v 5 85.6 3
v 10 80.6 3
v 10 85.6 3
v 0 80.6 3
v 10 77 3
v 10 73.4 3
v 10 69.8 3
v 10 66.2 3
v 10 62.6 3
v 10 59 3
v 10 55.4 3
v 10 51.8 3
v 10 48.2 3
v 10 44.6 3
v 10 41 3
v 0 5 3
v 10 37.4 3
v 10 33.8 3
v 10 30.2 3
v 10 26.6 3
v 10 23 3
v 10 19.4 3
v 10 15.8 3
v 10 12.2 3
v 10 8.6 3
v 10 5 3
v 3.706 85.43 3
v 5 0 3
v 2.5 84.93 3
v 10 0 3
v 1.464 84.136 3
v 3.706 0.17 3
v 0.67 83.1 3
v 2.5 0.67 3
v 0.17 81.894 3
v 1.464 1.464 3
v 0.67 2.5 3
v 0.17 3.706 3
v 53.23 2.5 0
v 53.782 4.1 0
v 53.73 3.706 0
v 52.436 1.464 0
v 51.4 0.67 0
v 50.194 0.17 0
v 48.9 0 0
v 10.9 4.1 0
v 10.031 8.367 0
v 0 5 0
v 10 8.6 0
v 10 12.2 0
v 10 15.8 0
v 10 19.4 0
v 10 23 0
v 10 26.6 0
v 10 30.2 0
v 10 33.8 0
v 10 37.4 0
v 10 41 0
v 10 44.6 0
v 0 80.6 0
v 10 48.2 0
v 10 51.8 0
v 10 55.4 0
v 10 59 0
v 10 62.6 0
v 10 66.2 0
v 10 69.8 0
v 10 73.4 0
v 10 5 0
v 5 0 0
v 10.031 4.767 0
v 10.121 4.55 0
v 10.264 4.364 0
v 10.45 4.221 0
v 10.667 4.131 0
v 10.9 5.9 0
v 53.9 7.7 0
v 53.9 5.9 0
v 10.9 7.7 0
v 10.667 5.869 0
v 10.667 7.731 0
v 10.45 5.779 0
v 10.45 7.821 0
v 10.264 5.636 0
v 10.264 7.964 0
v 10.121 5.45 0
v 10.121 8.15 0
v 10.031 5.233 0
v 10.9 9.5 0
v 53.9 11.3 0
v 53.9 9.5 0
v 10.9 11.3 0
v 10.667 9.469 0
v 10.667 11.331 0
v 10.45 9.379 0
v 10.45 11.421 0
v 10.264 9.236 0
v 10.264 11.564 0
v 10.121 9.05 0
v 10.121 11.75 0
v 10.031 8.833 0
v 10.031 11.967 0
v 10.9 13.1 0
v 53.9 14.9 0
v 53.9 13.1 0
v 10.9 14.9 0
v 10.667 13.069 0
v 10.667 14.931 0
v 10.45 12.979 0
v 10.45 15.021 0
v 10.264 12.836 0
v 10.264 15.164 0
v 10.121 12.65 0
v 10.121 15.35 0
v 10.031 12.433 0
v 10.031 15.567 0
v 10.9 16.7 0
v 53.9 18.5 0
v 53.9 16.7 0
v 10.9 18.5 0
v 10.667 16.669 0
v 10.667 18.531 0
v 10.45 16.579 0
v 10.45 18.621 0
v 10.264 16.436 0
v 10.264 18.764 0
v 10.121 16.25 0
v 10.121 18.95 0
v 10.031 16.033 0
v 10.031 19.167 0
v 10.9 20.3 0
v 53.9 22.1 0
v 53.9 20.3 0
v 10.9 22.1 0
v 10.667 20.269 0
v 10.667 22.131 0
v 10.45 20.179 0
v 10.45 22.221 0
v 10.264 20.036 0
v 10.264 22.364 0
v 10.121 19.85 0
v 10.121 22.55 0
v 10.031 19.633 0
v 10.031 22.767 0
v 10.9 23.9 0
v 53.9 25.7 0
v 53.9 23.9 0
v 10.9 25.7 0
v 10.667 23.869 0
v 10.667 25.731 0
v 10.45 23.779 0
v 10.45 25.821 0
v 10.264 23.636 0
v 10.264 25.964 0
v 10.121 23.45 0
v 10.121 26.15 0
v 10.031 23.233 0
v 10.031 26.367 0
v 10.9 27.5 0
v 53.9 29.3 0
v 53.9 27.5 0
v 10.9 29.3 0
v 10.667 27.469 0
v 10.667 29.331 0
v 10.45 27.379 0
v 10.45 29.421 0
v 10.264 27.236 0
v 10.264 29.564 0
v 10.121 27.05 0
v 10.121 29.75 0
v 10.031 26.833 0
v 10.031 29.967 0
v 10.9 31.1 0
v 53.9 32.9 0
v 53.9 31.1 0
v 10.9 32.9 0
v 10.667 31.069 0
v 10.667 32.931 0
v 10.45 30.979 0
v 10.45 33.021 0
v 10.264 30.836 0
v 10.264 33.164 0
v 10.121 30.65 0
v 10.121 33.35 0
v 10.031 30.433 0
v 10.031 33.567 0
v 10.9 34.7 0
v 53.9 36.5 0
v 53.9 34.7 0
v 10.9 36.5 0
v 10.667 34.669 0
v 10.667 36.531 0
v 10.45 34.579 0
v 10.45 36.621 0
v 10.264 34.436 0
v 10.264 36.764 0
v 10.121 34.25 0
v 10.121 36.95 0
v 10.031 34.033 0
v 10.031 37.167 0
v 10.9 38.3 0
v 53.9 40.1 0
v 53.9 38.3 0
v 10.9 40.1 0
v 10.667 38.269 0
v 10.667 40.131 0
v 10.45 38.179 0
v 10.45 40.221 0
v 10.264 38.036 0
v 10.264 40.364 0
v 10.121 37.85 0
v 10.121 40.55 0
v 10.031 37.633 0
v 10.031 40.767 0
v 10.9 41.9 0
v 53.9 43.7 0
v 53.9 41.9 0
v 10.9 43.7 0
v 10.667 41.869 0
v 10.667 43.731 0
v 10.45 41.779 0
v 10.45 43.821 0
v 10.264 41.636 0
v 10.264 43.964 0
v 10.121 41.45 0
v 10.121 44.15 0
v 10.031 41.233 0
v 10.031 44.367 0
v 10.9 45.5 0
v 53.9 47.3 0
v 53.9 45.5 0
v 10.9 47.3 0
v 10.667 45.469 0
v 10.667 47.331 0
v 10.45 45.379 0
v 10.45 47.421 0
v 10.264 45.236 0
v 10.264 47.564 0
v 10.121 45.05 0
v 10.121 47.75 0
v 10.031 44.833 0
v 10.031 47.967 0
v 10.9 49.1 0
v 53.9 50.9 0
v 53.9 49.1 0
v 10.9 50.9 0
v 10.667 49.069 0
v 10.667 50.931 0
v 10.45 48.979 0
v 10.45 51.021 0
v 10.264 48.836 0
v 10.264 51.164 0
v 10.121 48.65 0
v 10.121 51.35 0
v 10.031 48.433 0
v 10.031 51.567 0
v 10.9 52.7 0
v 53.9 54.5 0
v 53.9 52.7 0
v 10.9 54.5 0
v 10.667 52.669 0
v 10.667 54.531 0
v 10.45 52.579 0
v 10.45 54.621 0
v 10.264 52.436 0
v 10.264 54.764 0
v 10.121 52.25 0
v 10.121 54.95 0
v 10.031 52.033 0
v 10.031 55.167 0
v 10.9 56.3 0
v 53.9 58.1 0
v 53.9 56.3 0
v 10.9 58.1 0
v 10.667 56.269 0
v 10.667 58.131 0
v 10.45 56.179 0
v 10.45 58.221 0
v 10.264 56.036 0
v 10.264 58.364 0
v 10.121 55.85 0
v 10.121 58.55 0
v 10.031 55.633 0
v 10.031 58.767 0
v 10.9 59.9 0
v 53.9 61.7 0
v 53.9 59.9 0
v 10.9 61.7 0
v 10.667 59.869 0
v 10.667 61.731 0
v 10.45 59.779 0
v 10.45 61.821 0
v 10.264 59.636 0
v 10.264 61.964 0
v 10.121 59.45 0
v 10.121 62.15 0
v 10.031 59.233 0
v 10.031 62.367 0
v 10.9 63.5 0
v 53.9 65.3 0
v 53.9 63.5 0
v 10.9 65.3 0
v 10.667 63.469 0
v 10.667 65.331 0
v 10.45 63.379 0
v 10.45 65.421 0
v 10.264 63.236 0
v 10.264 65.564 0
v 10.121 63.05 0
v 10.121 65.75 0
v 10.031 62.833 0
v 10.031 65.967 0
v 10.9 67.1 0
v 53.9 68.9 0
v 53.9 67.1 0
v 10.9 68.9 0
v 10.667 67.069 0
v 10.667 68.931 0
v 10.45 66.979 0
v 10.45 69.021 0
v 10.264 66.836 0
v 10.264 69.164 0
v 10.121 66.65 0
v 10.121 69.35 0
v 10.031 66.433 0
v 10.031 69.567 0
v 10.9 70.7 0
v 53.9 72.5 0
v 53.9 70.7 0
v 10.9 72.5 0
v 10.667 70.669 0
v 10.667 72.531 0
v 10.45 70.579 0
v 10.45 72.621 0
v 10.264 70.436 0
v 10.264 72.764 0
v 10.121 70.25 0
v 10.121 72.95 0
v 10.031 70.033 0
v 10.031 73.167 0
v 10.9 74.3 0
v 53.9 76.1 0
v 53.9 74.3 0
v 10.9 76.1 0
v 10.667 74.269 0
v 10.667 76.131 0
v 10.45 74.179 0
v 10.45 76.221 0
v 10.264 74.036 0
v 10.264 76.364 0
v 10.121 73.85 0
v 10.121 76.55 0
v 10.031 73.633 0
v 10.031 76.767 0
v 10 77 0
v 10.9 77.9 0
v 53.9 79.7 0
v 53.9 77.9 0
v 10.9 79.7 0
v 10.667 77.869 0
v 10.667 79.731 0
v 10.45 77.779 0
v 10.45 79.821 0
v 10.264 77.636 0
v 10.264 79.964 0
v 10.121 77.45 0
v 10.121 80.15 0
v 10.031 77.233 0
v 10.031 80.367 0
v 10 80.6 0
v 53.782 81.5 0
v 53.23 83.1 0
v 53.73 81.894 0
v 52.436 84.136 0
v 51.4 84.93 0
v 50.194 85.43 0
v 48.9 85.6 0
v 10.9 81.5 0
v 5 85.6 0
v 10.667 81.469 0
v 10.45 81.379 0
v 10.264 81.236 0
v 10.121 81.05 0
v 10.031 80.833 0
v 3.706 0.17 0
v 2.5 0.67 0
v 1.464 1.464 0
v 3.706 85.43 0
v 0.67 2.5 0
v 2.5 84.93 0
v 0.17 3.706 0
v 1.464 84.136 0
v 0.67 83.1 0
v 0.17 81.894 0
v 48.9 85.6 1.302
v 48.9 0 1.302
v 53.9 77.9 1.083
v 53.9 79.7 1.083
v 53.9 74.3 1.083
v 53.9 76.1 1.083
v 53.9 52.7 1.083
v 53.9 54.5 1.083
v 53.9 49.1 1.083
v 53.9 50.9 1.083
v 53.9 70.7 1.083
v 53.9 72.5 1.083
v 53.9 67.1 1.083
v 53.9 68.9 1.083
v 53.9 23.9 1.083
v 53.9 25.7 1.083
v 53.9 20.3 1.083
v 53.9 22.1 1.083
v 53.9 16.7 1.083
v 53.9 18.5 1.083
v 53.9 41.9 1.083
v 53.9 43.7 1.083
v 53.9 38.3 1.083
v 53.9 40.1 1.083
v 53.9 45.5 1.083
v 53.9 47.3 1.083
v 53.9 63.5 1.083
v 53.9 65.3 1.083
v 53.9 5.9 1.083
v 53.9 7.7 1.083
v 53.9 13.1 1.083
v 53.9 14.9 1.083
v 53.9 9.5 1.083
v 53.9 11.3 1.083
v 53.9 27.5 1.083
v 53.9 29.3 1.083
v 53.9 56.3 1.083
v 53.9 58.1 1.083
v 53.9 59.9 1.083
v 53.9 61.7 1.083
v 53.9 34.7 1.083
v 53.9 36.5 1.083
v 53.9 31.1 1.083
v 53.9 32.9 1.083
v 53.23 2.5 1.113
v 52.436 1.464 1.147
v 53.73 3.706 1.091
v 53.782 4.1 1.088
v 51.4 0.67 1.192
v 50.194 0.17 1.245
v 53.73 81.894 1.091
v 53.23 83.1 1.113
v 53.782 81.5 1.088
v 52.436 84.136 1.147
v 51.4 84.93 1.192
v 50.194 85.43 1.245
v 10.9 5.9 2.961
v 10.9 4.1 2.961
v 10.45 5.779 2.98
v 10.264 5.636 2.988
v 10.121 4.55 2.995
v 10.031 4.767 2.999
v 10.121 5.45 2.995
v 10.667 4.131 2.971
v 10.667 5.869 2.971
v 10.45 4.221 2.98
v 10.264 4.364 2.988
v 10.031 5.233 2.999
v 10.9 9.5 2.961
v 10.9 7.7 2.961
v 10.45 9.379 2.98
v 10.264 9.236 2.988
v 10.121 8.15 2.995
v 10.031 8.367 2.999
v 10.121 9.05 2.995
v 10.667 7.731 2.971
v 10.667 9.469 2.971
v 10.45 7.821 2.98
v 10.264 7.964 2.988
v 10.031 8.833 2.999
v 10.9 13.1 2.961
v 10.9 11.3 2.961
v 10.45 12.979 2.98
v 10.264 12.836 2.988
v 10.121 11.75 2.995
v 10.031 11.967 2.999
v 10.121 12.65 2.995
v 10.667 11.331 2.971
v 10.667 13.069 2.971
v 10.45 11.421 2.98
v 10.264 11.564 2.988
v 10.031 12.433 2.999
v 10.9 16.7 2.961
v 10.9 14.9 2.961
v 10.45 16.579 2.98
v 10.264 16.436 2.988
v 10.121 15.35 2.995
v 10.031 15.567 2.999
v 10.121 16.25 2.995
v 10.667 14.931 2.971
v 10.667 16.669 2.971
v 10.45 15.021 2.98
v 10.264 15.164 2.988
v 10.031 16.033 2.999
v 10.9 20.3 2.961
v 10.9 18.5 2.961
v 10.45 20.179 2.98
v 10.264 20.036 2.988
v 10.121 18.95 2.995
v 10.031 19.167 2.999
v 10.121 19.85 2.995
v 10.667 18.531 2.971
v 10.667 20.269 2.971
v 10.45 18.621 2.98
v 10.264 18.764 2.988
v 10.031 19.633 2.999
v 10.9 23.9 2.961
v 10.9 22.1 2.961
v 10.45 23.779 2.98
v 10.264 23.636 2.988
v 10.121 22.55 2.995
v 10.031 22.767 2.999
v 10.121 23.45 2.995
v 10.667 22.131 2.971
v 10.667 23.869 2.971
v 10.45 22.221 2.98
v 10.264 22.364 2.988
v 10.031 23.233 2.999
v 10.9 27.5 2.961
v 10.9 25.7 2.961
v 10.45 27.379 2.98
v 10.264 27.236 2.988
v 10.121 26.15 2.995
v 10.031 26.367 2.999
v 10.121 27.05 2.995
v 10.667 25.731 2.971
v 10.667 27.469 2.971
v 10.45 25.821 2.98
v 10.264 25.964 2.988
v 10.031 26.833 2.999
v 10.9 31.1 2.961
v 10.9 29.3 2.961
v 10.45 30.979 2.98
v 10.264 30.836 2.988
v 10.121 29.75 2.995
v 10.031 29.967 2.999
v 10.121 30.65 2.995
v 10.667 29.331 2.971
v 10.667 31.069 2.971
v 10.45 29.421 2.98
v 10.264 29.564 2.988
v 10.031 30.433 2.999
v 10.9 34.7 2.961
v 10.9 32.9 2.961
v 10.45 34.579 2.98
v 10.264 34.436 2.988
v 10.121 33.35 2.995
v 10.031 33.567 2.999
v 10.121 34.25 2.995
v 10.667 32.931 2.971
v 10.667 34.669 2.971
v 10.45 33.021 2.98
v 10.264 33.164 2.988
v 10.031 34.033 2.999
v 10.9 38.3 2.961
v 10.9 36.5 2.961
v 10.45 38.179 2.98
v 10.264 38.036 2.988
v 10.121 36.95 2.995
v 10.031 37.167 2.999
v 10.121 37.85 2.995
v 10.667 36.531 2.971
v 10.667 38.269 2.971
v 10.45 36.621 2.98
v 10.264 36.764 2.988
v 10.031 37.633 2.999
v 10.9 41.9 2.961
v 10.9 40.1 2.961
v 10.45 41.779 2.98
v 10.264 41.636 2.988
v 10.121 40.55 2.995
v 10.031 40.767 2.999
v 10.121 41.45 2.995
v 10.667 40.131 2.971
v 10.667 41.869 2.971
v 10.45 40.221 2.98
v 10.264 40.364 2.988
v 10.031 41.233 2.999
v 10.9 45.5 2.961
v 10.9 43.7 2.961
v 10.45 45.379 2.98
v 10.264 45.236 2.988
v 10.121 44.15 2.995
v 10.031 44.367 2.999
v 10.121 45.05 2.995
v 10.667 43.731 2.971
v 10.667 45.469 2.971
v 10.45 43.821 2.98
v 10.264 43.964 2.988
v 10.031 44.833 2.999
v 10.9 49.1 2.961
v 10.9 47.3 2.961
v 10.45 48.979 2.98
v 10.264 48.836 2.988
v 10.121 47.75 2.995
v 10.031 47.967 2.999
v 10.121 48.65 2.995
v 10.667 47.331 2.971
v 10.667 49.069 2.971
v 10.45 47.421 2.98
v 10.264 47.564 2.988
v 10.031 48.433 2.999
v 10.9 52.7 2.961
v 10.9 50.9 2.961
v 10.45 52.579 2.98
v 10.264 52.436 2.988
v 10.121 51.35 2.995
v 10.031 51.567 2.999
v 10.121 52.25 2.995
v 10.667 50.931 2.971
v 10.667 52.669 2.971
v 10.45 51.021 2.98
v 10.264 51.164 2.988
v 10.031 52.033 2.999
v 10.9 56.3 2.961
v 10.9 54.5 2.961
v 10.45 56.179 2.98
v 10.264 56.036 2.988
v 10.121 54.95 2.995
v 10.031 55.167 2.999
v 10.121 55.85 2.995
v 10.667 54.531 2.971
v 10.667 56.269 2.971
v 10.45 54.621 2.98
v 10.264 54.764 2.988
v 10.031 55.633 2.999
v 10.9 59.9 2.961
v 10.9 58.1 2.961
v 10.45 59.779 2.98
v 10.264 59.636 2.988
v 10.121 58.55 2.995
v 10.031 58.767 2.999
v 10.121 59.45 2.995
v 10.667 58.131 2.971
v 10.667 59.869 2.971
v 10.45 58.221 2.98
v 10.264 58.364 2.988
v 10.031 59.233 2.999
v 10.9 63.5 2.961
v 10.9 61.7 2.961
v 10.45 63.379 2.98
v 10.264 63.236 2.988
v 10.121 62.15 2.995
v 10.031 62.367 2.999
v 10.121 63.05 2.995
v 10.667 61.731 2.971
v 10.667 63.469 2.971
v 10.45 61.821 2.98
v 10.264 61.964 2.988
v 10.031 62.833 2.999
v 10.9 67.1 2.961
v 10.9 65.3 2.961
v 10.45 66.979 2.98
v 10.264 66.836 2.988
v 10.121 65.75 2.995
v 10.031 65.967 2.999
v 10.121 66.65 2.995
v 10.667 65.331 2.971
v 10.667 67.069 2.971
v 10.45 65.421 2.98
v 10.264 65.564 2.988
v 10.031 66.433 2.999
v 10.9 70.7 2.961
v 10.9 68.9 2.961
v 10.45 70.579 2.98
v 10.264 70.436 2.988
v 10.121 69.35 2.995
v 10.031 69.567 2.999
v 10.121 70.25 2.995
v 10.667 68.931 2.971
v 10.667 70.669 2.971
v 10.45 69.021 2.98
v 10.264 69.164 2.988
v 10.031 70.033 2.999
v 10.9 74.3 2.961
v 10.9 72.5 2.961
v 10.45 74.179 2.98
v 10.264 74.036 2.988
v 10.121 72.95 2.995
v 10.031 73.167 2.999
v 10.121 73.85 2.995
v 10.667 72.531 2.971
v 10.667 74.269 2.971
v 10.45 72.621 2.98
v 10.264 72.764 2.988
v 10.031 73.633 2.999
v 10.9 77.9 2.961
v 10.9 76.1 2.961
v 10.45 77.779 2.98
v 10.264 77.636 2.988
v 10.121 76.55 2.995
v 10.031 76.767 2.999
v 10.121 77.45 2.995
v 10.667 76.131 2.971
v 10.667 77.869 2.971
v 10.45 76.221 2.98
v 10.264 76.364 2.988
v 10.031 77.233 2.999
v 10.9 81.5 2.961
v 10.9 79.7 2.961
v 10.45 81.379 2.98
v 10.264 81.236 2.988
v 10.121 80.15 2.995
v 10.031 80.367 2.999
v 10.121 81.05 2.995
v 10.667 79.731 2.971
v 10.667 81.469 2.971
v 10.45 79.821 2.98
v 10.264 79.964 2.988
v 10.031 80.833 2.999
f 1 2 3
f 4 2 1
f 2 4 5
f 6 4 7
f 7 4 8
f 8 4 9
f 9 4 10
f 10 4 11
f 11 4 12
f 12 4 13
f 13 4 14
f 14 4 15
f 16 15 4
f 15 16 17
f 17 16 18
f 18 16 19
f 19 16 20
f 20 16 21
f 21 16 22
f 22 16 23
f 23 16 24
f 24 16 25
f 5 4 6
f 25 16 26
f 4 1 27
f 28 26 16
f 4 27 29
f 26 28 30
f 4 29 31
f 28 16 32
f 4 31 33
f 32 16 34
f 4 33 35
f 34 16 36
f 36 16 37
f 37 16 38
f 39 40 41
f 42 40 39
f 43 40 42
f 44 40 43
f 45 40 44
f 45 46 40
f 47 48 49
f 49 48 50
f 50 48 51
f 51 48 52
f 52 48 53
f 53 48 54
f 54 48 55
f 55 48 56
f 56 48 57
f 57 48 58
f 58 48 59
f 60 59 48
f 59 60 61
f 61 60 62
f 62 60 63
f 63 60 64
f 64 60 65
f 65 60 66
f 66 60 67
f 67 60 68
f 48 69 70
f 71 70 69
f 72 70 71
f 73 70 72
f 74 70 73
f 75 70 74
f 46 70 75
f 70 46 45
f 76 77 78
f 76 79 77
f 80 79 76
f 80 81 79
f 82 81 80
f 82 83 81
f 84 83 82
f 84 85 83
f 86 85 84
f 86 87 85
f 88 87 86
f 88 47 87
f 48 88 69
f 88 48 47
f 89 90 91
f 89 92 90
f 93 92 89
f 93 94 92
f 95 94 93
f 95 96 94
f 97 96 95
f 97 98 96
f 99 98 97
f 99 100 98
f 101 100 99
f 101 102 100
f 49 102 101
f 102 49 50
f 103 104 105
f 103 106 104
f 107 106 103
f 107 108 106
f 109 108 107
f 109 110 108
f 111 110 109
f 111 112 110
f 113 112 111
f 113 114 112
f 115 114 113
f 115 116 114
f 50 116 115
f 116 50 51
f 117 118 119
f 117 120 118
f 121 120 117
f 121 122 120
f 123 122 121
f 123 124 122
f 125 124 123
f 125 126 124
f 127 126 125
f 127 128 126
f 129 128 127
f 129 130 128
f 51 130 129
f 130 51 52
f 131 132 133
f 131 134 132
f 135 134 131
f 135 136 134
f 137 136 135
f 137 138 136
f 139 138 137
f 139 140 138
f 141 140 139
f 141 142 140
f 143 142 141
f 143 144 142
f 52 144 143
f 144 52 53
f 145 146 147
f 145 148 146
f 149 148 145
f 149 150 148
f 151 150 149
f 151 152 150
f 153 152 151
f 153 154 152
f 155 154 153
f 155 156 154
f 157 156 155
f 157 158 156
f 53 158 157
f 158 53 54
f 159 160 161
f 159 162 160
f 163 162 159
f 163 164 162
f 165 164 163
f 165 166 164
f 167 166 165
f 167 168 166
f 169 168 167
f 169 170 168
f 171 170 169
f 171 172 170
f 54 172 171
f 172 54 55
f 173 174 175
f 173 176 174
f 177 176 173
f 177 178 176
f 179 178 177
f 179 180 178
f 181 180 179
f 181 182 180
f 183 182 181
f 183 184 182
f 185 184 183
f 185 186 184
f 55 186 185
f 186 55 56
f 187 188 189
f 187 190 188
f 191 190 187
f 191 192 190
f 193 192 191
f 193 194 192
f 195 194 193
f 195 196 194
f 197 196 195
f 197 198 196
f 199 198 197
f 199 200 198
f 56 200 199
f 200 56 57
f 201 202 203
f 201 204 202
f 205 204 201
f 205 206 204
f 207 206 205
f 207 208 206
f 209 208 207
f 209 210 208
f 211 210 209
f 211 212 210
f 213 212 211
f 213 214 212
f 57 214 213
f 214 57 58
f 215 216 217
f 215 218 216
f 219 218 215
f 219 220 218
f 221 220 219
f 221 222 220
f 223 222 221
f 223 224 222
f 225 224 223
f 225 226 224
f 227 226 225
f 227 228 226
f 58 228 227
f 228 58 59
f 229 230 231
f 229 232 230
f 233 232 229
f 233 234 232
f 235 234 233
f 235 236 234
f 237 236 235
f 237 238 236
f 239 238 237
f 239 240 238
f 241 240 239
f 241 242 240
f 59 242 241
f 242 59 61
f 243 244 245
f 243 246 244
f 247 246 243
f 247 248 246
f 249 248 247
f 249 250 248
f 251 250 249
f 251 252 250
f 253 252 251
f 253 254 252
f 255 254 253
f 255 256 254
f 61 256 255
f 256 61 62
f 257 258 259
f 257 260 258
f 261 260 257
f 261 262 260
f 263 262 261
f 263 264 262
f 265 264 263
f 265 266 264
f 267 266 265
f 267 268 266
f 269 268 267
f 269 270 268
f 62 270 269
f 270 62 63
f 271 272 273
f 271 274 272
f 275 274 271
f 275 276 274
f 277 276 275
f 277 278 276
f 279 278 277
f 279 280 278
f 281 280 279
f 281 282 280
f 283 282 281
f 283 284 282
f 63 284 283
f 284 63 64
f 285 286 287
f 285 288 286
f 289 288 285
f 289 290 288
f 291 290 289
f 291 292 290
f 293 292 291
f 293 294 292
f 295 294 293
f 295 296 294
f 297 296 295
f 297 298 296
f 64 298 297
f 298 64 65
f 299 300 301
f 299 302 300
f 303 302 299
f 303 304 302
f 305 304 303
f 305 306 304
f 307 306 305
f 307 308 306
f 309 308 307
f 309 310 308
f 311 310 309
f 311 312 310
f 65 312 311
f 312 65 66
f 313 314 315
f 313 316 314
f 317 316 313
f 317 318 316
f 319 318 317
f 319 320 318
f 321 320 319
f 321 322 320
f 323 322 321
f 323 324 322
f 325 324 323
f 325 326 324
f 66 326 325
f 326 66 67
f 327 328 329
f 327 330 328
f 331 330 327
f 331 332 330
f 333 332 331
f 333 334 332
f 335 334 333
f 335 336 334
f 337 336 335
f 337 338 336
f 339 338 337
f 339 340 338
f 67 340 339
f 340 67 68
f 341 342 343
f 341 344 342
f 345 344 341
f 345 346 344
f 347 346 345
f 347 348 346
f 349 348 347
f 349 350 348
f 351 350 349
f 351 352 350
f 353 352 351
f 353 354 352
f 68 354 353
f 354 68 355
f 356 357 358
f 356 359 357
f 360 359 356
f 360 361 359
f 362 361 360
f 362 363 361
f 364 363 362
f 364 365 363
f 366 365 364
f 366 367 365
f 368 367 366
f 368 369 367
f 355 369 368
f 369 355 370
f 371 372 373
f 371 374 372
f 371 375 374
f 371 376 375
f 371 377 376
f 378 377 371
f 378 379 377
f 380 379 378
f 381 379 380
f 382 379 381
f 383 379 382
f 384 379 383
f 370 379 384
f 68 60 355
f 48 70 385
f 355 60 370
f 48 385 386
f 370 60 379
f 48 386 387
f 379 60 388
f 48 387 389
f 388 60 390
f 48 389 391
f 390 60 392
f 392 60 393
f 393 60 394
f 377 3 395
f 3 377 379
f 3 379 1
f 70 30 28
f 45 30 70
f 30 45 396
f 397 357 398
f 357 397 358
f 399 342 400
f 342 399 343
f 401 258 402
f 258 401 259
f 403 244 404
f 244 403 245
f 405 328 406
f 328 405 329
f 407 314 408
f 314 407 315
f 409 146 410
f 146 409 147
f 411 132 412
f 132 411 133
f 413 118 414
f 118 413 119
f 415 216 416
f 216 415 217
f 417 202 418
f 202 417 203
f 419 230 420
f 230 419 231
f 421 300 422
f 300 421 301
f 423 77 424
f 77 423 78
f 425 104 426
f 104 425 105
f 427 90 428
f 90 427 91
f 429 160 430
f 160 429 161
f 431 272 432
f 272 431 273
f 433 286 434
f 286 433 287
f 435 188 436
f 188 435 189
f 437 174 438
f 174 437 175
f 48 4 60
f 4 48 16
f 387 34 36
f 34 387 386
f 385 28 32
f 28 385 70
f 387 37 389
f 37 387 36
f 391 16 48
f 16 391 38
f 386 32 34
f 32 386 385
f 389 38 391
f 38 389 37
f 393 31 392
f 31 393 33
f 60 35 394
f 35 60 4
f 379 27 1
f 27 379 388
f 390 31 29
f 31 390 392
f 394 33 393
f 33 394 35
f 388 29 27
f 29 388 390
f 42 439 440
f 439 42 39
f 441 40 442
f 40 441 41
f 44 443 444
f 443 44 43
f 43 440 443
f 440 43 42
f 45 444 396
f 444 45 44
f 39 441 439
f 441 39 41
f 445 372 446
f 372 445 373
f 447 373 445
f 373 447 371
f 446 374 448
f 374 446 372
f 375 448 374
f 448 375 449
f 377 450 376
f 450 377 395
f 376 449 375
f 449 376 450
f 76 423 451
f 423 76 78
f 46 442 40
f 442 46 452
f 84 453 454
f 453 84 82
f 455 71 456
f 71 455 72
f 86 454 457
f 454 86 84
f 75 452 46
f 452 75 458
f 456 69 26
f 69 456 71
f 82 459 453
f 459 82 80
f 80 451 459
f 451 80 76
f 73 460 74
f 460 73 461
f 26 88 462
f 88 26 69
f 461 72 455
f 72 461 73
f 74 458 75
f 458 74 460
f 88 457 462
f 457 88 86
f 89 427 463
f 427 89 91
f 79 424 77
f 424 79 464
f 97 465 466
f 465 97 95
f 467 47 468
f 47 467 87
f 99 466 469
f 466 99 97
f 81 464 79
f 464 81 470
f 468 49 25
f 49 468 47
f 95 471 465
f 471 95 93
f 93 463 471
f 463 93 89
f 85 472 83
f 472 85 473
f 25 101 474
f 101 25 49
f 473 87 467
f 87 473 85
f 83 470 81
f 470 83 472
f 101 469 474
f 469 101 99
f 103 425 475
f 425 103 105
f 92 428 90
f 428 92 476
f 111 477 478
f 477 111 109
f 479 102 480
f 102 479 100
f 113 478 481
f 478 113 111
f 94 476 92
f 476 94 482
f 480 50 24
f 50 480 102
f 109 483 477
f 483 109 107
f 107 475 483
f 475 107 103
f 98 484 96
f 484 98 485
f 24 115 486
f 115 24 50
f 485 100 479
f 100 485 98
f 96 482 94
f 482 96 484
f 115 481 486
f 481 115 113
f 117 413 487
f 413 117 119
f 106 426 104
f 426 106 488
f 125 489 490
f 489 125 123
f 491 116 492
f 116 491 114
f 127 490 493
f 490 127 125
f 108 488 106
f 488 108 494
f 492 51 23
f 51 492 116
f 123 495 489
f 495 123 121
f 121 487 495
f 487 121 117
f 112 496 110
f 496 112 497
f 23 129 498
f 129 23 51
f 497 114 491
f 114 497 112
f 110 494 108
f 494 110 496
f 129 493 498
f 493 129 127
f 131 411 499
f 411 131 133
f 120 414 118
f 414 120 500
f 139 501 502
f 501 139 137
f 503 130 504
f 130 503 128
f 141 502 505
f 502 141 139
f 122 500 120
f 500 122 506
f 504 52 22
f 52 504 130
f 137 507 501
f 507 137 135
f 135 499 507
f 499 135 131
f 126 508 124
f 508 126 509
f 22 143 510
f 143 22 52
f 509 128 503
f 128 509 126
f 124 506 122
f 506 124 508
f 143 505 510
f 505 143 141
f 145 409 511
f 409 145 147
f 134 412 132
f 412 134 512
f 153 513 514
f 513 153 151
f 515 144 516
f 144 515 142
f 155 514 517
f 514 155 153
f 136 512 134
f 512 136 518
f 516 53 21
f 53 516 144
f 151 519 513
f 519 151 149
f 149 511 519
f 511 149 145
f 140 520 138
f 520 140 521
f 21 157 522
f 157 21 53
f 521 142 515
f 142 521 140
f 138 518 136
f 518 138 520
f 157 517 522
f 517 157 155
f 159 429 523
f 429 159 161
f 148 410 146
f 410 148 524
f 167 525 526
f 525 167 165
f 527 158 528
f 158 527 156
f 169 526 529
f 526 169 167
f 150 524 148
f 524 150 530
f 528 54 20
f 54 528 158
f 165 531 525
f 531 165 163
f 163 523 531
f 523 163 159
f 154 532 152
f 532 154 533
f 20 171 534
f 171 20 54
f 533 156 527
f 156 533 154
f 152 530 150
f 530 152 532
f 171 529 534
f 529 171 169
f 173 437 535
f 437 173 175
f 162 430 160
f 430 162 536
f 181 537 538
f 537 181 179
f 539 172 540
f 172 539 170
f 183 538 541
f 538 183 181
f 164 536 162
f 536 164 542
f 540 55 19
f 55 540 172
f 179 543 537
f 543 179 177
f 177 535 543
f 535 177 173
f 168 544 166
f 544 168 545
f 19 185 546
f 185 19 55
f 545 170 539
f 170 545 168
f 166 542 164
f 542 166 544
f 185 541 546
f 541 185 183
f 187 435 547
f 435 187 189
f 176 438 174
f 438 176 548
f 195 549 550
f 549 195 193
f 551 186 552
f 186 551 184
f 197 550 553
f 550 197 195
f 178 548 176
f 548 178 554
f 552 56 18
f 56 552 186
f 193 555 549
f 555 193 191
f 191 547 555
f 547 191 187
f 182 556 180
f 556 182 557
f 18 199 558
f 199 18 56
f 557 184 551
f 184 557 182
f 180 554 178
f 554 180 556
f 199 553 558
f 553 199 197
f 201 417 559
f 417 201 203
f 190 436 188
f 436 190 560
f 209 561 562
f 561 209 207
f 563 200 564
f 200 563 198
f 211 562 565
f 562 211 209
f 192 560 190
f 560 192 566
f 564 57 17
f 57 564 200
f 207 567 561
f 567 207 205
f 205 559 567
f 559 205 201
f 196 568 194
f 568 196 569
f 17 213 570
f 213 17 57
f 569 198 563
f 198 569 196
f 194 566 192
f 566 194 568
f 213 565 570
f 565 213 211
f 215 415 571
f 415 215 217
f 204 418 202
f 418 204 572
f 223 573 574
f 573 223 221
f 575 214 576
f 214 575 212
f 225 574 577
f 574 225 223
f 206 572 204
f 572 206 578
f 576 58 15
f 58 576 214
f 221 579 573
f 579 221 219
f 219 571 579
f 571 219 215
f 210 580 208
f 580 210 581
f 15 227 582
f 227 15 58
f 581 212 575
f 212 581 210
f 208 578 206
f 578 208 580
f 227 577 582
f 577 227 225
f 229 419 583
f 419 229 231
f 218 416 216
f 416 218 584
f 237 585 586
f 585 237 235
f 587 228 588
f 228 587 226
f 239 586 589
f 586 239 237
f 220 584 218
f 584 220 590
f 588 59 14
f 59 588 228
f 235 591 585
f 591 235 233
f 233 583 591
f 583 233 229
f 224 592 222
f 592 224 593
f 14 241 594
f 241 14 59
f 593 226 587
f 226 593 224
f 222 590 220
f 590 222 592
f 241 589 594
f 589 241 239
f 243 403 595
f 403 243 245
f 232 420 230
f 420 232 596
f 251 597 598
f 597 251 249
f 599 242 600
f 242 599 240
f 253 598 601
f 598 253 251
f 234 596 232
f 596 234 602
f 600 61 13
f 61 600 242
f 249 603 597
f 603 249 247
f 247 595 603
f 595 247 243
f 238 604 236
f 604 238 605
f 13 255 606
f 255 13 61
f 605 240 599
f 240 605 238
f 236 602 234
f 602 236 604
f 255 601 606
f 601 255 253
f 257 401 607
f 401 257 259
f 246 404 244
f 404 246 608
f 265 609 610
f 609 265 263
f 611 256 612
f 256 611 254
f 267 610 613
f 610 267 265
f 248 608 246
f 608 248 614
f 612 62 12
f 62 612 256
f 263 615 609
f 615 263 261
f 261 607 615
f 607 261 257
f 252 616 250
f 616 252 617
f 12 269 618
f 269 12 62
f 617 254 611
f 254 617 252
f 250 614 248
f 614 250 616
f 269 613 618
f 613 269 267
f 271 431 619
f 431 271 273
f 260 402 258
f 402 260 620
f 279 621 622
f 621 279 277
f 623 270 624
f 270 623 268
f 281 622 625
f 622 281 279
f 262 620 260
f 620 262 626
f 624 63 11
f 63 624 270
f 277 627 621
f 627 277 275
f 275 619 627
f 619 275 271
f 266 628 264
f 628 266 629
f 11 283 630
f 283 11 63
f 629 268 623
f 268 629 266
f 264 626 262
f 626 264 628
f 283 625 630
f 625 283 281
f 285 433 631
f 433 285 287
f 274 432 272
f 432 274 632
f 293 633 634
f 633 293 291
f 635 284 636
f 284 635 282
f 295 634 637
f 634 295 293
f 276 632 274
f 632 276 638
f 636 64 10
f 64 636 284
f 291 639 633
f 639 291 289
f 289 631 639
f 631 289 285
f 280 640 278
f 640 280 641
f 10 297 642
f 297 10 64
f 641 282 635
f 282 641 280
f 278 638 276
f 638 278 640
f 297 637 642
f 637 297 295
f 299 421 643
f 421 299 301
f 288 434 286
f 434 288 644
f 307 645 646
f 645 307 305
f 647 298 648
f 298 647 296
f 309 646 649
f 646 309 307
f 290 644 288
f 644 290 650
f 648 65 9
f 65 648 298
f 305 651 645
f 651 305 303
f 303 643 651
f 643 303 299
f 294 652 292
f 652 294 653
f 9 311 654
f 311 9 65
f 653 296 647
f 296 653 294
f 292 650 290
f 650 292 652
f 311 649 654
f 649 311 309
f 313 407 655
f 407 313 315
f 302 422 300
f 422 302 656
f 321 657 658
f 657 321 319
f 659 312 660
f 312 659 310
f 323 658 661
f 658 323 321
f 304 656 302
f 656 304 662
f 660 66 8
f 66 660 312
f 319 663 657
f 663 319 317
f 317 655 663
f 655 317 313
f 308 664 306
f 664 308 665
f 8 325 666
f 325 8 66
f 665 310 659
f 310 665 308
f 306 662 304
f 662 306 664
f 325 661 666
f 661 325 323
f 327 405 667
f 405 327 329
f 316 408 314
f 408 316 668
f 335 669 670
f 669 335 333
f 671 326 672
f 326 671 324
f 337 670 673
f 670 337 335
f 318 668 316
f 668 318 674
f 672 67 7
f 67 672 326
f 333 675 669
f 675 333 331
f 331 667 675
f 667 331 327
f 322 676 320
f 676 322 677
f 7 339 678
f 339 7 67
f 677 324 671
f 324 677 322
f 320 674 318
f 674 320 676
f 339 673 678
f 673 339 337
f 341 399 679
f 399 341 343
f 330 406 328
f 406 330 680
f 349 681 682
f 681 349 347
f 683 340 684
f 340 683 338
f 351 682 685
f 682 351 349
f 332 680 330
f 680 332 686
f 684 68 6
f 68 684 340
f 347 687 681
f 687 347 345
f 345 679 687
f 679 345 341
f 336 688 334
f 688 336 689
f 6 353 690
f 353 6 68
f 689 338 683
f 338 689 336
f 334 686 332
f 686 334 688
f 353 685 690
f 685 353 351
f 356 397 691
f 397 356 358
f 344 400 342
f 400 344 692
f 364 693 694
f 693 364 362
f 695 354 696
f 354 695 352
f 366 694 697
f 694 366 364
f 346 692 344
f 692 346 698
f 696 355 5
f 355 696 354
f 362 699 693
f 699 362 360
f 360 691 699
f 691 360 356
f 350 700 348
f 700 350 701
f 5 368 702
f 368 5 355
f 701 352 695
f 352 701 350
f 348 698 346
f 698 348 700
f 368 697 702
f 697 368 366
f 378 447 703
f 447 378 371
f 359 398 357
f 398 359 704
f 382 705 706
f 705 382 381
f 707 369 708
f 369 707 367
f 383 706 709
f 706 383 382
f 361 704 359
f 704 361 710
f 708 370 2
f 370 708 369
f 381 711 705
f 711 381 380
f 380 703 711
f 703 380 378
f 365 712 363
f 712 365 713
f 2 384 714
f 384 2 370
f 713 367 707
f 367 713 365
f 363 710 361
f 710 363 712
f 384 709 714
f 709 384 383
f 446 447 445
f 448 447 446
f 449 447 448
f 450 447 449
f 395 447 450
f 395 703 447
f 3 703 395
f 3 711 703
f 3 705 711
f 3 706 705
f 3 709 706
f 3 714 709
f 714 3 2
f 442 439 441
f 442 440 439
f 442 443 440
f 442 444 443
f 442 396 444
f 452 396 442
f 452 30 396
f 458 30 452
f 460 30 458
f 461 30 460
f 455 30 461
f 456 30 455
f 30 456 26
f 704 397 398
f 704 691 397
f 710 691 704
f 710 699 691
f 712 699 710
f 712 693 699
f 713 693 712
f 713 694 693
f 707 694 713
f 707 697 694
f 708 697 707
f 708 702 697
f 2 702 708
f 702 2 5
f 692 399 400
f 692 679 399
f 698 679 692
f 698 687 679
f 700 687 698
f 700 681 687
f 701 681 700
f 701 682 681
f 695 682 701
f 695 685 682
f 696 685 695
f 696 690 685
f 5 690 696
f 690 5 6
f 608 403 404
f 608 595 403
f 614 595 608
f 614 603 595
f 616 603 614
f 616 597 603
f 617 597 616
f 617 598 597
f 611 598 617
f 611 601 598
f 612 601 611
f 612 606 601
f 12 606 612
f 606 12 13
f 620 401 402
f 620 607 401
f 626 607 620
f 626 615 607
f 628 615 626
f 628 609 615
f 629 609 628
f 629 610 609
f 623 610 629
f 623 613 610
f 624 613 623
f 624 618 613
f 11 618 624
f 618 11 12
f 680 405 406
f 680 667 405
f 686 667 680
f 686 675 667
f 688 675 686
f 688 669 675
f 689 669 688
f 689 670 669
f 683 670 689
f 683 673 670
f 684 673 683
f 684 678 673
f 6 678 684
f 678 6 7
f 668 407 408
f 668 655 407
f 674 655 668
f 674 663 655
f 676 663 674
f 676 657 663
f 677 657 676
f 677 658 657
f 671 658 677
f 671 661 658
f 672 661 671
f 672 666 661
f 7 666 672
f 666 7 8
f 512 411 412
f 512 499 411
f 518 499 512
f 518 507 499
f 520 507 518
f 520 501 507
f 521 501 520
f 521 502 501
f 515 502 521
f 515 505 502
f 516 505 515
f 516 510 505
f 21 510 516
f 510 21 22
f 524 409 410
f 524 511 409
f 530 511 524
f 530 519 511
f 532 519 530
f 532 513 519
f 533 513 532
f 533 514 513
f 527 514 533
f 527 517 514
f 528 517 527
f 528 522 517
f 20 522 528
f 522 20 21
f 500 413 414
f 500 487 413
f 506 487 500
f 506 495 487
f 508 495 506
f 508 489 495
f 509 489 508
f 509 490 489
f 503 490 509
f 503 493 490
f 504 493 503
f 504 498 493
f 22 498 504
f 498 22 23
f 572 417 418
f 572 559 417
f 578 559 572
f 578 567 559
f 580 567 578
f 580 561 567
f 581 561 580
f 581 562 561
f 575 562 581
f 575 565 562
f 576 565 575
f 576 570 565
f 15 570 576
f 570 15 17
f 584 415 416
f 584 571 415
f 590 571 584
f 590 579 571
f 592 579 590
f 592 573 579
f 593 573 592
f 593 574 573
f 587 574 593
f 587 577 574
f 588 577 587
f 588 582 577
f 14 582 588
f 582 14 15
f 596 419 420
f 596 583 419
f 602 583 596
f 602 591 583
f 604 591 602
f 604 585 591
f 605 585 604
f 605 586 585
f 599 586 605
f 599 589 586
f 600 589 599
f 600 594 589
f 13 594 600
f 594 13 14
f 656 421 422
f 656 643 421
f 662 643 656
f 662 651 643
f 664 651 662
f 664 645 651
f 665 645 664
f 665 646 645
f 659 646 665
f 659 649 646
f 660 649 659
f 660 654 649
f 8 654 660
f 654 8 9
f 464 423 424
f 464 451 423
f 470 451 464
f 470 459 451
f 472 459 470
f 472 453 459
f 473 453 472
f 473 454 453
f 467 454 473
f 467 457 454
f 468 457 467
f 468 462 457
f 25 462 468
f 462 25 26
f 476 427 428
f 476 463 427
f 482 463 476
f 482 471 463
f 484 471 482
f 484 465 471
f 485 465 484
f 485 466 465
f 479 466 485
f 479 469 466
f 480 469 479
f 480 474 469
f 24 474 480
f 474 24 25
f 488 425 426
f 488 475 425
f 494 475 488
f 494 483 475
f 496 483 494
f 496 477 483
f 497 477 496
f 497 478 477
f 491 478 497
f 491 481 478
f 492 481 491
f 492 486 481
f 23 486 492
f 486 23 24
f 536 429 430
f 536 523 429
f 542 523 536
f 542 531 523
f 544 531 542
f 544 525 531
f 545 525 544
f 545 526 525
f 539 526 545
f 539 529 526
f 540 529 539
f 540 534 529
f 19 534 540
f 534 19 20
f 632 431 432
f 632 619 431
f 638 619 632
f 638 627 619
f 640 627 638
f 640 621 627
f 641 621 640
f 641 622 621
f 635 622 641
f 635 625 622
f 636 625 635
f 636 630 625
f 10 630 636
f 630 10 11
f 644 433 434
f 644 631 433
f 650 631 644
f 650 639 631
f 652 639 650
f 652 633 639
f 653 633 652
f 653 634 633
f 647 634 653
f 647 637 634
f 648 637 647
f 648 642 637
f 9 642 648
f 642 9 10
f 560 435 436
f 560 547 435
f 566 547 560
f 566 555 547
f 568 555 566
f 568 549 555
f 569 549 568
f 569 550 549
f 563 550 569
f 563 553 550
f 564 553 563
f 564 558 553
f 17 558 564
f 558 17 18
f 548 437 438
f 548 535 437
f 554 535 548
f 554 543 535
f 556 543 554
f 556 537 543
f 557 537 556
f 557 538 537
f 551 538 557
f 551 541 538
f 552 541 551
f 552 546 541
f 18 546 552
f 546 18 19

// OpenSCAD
/**
 * Parametric Hair Comb
 * Author: Kenneth Barbour 2014
 * 
 * A quick and simple parametric hair comb I intend to carry in my pocket.
 */
$fn = 24;
thickness = 3; // Thickness
length = 85.6; // Overall length
width = 53.9; // Overall Width
taper = 2.5; // Tooth taper angle
tooth_pitch = 1.8; // Tooth thickness
spine_thickness = 10; // Spine thickness
corner_radius = 5; // Corner radius

total_teeth = floor((length - 2*tooth_pitch) / (2*tooth_pitch)) - 1;
tooth_section = (tooth_pitch*total_teeth*2 + tooth_pitch); // Length of toothed section

difference() {
	rounded_cube([width, length, thickness], corner_radius);
	translate([spine_thickness,0,thickness]) rotate([0,taper,0]) cube([width+spine_thickness, length, thickness*2]);
	translate([0, (length - tooth_section)/2, 0]) 
	for (i = [0 : total_teeth]) {
		translate([spine_thickness, i * tooth_pitch * 2,0]) rounded_cube([width, tooth_pitch, thickness], tooth_pitch/2);
	}
}

module rounded_cube(size=[1,1,1], r=0) {
	translate([r,0,0]) cube([size[0]-2*r,size[1],size[2]]);
	translate([0,r,0]) cube([size[0],size[1]-2*r,size[2]]);
	translate([r,r,0]) cylinder(r=r, h=size[2]);
	translate([r,size[1]-r,0]) cylinder(r=r, h=size[2]);
	translate([size[0]-r,r,0]) cylinder(r=r, h=size[2]);
	translate([size[0]-r,size[1]-r,0]) cylinder(r=r, h=size[2]);
}
